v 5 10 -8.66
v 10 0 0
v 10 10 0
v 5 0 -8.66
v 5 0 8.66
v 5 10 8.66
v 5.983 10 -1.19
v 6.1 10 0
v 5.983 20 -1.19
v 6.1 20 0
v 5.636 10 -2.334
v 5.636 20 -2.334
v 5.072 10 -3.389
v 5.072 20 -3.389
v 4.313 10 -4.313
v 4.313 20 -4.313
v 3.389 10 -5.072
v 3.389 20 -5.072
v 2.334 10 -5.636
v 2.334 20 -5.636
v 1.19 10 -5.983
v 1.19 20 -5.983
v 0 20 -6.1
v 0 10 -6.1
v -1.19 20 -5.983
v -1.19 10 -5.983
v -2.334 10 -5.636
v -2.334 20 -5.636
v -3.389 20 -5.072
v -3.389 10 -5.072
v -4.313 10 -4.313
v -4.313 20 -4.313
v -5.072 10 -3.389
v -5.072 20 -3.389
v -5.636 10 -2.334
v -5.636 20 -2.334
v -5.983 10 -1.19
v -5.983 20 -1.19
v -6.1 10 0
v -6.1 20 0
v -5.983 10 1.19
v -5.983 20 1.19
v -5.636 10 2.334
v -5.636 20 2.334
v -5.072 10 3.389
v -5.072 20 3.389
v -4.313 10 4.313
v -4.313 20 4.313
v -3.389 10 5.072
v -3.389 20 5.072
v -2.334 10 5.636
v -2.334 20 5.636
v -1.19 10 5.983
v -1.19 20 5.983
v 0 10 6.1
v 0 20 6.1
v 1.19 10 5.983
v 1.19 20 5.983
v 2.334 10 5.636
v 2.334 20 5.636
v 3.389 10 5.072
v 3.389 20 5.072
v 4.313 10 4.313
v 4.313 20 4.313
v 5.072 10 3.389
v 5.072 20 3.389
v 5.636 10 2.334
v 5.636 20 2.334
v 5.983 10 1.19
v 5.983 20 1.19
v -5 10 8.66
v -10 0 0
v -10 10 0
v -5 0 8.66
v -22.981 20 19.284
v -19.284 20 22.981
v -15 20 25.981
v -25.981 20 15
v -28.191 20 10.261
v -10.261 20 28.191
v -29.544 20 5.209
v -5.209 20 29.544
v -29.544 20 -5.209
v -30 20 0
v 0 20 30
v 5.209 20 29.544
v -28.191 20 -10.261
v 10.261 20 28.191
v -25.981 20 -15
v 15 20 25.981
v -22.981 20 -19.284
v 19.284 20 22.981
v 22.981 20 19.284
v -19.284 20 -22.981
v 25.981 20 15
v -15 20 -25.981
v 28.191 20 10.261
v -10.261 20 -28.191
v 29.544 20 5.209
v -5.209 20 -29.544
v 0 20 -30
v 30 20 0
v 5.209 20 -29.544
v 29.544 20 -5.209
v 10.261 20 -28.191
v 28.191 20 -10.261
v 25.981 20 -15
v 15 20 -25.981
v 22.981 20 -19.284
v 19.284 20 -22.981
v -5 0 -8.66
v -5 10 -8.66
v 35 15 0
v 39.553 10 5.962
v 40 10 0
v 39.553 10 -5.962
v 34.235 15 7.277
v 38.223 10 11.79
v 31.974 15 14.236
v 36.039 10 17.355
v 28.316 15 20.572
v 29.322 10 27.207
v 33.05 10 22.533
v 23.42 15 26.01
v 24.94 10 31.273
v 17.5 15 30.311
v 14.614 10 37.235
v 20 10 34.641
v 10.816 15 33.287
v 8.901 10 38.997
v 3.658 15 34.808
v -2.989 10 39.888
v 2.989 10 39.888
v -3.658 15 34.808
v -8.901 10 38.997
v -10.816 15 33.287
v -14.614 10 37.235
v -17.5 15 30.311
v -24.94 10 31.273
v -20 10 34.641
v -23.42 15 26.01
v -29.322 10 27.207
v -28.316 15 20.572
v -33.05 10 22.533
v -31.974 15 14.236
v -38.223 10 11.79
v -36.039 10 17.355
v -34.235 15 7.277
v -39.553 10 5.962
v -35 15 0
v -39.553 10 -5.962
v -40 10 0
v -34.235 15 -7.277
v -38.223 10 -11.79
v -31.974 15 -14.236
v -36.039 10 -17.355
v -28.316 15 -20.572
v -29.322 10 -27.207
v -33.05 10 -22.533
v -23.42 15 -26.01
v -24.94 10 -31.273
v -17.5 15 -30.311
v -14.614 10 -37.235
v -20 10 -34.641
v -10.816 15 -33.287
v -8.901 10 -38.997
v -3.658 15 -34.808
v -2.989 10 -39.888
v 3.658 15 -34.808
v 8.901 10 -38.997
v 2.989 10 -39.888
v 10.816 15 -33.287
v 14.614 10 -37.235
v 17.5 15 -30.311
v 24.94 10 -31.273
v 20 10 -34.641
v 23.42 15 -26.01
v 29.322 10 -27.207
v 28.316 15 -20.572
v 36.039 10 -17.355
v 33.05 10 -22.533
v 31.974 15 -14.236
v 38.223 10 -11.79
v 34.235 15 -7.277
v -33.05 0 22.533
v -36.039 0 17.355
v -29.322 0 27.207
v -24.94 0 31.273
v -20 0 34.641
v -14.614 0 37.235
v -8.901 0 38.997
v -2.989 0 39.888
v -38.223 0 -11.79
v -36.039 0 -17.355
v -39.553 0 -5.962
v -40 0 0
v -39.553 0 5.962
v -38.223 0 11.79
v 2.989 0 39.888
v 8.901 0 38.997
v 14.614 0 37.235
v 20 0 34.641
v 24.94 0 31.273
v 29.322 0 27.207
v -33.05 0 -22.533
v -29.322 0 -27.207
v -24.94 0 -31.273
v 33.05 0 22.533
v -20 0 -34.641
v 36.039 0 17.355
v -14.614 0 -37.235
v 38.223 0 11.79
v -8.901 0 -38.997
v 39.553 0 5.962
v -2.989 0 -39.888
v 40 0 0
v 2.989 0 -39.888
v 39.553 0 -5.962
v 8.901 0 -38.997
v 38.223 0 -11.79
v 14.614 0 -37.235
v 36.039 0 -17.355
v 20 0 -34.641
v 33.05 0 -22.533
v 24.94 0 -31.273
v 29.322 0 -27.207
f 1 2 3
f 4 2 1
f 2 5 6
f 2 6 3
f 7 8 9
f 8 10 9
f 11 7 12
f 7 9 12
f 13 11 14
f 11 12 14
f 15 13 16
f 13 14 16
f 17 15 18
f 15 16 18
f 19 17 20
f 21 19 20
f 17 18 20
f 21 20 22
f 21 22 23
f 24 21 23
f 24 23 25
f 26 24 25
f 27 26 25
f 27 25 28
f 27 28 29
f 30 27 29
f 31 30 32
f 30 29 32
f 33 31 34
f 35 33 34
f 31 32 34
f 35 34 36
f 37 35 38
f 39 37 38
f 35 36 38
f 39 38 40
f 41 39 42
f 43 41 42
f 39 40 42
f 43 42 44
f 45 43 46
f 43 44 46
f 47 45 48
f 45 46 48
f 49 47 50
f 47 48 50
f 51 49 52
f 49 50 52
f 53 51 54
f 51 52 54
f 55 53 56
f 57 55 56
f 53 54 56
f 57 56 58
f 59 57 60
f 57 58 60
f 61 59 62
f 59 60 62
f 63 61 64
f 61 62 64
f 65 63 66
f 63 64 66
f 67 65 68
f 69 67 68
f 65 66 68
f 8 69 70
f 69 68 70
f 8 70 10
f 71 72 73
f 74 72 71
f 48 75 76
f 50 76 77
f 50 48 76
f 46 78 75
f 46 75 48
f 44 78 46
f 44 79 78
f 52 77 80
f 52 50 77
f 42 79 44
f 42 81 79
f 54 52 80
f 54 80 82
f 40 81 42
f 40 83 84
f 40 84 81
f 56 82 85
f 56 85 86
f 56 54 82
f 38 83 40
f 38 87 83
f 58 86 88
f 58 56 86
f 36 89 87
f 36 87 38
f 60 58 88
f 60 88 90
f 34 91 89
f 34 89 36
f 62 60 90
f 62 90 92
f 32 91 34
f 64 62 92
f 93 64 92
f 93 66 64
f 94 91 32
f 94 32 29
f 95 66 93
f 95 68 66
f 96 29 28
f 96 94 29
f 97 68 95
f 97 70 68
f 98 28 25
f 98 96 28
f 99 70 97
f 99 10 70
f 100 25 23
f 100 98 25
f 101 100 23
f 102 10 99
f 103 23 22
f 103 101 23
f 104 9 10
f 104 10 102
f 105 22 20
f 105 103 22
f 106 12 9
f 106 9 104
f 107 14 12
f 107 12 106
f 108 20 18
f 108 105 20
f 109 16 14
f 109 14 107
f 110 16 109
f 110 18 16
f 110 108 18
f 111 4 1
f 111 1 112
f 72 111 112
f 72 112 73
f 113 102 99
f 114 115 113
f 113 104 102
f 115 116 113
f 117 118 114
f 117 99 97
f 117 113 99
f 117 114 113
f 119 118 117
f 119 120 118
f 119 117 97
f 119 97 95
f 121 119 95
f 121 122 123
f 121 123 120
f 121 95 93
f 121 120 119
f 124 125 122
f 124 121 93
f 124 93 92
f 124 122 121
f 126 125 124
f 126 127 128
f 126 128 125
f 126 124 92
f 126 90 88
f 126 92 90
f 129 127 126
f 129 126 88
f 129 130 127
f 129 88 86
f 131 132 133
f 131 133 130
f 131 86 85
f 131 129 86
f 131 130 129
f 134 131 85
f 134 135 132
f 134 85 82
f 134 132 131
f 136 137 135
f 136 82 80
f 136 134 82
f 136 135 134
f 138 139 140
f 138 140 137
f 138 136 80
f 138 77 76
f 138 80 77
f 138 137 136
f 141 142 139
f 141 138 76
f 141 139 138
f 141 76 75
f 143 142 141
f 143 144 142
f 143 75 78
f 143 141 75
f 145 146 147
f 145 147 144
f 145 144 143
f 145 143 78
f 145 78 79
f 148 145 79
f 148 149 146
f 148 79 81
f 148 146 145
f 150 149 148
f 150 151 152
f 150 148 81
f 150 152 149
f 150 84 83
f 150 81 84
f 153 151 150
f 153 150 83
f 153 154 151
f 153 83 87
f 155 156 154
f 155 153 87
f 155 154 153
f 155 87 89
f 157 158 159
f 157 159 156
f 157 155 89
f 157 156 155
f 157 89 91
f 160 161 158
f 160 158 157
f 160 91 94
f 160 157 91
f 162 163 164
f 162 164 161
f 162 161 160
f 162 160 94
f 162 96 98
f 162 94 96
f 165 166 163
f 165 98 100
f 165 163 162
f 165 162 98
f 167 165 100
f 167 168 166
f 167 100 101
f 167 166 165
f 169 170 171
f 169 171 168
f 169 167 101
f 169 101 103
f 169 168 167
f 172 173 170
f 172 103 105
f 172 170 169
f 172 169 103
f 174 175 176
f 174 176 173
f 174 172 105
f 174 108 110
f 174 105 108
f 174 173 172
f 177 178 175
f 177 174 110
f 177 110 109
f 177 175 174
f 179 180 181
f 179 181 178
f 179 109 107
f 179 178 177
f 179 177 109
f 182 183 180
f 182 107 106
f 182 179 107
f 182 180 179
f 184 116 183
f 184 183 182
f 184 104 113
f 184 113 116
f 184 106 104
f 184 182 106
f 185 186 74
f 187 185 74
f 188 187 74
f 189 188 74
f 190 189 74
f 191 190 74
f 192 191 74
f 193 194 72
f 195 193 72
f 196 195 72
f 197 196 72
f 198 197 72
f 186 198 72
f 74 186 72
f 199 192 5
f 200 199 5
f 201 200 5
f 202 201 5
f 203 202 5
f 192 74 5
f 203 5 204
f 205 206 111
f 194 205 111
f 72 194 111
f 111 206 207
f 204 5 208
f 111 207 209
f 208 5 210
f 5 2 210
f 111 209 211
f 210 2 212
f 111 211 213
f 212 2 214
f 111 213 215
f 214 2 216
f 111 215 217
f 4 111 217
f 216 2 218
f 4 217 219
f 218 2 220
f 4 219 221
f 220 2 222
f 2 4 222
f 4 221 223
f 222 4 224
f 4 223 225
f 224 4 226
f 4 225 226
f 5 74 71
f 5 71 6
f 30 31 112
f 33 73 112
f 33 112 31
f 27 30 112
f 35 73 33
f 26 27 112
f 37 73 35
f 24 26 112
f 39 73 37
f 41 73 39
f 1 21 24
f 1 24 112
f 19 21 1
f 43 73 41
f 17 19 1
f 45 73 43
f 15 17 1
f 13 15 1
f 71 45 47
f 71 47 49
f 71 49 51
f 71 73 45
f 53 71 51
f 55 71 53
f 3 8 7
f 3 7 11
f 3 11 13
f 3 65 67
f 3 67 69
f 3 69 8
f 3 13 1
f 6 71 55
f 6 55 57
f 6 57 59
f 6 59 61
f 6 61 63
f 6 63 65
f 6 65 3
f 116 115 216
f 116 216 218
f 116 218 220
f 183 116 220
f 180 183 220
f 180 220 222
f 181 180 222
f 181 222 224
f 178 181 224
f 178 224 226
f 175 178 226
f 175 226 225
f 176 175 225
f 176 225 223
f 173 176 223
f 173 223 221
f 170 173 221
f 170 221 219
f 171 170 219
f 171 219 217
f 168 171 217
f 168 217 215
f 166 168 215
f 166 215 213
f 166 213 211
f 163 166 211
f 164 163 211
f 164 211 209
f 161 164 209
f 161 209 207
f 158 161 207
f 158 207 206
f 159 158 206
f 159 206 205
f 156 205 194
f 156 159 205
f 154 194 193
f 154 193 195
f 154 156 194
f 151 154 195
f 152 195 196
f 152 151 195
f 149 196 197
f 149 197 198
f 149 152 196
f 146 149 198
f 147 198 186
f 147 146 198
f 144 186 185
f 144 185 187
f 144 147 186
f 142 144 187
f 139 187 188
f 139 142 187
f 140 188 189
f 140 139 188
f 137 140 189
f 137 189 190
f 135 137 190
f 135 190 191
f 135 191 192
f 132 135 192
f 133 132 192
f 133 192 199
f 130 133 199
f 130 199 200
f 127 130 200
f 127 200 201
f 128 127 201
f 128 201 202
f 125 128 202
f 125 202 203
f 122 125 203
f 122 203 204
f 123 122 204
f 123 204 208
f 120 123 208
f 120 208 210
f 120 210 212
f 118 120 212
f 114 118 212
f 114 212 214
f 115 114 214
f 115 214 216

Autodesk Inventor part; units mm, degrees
sketch "Esboço1" plane through (0, 0, 0) normal (0, 0, 1) x (1, 0, 0)
  line L0 (-40, 0) -> (-40, 10)
  line L1 (-40, 10) -> (-30, 20)
  line L2 (-30, 20) -> (0, 20)
  line L3 (-40, 0) -> (0, 0)
  line L4 (0, 20) -> (0, 0)
  line L5 (0, -4) -> (0, 24) projected
  dimension "d0" = 40
  dimension "d1" = 10
  dimension "d6" = 135
  dimension "d7" = 30
revolve "Revolução1" add sketch "Esboço1" angle 360 mid plane about axis through (0, -10, 0) along (0, 1, 0)
sketch "Esboço2" plane through (0, 20, 0) normal (0, 1, 0) x (1, 0, 0)
  circle A0 centre (0, 0) radius 6.1
  dimension "d9" = 12.2
extrude "Extrusão1" cut sketch "Esboço2" against normal through all
sketch "Esboço3" plane through (0, 0, 0) normal (0, -1, 0) x (1, 0, 0)
  line L0 (5, 8.6603) -> (10, 0)
  line L1 (10, 0) -> (5, -8.6603)
  line L2 (5, -8.6603) -> (-5, -8.6603)
  line L3 (-5, -8.6603) -> (-10, 0)
  line L4 (-10, 0) -> (-5, 8.6603)
  line L5 (-5, 8.6603) -> (5, 8.6603)
  point P0 (0, 0)
  point P1 (0, 0)
  point P2 (0, 8.6603)
  dimension "d12" = 10
extrude "Extrusão2" cut sketch "Esboço3" against normal blind 10
properties part number "Sessao9__08_04_2025_0001_001" material "Ouro"
